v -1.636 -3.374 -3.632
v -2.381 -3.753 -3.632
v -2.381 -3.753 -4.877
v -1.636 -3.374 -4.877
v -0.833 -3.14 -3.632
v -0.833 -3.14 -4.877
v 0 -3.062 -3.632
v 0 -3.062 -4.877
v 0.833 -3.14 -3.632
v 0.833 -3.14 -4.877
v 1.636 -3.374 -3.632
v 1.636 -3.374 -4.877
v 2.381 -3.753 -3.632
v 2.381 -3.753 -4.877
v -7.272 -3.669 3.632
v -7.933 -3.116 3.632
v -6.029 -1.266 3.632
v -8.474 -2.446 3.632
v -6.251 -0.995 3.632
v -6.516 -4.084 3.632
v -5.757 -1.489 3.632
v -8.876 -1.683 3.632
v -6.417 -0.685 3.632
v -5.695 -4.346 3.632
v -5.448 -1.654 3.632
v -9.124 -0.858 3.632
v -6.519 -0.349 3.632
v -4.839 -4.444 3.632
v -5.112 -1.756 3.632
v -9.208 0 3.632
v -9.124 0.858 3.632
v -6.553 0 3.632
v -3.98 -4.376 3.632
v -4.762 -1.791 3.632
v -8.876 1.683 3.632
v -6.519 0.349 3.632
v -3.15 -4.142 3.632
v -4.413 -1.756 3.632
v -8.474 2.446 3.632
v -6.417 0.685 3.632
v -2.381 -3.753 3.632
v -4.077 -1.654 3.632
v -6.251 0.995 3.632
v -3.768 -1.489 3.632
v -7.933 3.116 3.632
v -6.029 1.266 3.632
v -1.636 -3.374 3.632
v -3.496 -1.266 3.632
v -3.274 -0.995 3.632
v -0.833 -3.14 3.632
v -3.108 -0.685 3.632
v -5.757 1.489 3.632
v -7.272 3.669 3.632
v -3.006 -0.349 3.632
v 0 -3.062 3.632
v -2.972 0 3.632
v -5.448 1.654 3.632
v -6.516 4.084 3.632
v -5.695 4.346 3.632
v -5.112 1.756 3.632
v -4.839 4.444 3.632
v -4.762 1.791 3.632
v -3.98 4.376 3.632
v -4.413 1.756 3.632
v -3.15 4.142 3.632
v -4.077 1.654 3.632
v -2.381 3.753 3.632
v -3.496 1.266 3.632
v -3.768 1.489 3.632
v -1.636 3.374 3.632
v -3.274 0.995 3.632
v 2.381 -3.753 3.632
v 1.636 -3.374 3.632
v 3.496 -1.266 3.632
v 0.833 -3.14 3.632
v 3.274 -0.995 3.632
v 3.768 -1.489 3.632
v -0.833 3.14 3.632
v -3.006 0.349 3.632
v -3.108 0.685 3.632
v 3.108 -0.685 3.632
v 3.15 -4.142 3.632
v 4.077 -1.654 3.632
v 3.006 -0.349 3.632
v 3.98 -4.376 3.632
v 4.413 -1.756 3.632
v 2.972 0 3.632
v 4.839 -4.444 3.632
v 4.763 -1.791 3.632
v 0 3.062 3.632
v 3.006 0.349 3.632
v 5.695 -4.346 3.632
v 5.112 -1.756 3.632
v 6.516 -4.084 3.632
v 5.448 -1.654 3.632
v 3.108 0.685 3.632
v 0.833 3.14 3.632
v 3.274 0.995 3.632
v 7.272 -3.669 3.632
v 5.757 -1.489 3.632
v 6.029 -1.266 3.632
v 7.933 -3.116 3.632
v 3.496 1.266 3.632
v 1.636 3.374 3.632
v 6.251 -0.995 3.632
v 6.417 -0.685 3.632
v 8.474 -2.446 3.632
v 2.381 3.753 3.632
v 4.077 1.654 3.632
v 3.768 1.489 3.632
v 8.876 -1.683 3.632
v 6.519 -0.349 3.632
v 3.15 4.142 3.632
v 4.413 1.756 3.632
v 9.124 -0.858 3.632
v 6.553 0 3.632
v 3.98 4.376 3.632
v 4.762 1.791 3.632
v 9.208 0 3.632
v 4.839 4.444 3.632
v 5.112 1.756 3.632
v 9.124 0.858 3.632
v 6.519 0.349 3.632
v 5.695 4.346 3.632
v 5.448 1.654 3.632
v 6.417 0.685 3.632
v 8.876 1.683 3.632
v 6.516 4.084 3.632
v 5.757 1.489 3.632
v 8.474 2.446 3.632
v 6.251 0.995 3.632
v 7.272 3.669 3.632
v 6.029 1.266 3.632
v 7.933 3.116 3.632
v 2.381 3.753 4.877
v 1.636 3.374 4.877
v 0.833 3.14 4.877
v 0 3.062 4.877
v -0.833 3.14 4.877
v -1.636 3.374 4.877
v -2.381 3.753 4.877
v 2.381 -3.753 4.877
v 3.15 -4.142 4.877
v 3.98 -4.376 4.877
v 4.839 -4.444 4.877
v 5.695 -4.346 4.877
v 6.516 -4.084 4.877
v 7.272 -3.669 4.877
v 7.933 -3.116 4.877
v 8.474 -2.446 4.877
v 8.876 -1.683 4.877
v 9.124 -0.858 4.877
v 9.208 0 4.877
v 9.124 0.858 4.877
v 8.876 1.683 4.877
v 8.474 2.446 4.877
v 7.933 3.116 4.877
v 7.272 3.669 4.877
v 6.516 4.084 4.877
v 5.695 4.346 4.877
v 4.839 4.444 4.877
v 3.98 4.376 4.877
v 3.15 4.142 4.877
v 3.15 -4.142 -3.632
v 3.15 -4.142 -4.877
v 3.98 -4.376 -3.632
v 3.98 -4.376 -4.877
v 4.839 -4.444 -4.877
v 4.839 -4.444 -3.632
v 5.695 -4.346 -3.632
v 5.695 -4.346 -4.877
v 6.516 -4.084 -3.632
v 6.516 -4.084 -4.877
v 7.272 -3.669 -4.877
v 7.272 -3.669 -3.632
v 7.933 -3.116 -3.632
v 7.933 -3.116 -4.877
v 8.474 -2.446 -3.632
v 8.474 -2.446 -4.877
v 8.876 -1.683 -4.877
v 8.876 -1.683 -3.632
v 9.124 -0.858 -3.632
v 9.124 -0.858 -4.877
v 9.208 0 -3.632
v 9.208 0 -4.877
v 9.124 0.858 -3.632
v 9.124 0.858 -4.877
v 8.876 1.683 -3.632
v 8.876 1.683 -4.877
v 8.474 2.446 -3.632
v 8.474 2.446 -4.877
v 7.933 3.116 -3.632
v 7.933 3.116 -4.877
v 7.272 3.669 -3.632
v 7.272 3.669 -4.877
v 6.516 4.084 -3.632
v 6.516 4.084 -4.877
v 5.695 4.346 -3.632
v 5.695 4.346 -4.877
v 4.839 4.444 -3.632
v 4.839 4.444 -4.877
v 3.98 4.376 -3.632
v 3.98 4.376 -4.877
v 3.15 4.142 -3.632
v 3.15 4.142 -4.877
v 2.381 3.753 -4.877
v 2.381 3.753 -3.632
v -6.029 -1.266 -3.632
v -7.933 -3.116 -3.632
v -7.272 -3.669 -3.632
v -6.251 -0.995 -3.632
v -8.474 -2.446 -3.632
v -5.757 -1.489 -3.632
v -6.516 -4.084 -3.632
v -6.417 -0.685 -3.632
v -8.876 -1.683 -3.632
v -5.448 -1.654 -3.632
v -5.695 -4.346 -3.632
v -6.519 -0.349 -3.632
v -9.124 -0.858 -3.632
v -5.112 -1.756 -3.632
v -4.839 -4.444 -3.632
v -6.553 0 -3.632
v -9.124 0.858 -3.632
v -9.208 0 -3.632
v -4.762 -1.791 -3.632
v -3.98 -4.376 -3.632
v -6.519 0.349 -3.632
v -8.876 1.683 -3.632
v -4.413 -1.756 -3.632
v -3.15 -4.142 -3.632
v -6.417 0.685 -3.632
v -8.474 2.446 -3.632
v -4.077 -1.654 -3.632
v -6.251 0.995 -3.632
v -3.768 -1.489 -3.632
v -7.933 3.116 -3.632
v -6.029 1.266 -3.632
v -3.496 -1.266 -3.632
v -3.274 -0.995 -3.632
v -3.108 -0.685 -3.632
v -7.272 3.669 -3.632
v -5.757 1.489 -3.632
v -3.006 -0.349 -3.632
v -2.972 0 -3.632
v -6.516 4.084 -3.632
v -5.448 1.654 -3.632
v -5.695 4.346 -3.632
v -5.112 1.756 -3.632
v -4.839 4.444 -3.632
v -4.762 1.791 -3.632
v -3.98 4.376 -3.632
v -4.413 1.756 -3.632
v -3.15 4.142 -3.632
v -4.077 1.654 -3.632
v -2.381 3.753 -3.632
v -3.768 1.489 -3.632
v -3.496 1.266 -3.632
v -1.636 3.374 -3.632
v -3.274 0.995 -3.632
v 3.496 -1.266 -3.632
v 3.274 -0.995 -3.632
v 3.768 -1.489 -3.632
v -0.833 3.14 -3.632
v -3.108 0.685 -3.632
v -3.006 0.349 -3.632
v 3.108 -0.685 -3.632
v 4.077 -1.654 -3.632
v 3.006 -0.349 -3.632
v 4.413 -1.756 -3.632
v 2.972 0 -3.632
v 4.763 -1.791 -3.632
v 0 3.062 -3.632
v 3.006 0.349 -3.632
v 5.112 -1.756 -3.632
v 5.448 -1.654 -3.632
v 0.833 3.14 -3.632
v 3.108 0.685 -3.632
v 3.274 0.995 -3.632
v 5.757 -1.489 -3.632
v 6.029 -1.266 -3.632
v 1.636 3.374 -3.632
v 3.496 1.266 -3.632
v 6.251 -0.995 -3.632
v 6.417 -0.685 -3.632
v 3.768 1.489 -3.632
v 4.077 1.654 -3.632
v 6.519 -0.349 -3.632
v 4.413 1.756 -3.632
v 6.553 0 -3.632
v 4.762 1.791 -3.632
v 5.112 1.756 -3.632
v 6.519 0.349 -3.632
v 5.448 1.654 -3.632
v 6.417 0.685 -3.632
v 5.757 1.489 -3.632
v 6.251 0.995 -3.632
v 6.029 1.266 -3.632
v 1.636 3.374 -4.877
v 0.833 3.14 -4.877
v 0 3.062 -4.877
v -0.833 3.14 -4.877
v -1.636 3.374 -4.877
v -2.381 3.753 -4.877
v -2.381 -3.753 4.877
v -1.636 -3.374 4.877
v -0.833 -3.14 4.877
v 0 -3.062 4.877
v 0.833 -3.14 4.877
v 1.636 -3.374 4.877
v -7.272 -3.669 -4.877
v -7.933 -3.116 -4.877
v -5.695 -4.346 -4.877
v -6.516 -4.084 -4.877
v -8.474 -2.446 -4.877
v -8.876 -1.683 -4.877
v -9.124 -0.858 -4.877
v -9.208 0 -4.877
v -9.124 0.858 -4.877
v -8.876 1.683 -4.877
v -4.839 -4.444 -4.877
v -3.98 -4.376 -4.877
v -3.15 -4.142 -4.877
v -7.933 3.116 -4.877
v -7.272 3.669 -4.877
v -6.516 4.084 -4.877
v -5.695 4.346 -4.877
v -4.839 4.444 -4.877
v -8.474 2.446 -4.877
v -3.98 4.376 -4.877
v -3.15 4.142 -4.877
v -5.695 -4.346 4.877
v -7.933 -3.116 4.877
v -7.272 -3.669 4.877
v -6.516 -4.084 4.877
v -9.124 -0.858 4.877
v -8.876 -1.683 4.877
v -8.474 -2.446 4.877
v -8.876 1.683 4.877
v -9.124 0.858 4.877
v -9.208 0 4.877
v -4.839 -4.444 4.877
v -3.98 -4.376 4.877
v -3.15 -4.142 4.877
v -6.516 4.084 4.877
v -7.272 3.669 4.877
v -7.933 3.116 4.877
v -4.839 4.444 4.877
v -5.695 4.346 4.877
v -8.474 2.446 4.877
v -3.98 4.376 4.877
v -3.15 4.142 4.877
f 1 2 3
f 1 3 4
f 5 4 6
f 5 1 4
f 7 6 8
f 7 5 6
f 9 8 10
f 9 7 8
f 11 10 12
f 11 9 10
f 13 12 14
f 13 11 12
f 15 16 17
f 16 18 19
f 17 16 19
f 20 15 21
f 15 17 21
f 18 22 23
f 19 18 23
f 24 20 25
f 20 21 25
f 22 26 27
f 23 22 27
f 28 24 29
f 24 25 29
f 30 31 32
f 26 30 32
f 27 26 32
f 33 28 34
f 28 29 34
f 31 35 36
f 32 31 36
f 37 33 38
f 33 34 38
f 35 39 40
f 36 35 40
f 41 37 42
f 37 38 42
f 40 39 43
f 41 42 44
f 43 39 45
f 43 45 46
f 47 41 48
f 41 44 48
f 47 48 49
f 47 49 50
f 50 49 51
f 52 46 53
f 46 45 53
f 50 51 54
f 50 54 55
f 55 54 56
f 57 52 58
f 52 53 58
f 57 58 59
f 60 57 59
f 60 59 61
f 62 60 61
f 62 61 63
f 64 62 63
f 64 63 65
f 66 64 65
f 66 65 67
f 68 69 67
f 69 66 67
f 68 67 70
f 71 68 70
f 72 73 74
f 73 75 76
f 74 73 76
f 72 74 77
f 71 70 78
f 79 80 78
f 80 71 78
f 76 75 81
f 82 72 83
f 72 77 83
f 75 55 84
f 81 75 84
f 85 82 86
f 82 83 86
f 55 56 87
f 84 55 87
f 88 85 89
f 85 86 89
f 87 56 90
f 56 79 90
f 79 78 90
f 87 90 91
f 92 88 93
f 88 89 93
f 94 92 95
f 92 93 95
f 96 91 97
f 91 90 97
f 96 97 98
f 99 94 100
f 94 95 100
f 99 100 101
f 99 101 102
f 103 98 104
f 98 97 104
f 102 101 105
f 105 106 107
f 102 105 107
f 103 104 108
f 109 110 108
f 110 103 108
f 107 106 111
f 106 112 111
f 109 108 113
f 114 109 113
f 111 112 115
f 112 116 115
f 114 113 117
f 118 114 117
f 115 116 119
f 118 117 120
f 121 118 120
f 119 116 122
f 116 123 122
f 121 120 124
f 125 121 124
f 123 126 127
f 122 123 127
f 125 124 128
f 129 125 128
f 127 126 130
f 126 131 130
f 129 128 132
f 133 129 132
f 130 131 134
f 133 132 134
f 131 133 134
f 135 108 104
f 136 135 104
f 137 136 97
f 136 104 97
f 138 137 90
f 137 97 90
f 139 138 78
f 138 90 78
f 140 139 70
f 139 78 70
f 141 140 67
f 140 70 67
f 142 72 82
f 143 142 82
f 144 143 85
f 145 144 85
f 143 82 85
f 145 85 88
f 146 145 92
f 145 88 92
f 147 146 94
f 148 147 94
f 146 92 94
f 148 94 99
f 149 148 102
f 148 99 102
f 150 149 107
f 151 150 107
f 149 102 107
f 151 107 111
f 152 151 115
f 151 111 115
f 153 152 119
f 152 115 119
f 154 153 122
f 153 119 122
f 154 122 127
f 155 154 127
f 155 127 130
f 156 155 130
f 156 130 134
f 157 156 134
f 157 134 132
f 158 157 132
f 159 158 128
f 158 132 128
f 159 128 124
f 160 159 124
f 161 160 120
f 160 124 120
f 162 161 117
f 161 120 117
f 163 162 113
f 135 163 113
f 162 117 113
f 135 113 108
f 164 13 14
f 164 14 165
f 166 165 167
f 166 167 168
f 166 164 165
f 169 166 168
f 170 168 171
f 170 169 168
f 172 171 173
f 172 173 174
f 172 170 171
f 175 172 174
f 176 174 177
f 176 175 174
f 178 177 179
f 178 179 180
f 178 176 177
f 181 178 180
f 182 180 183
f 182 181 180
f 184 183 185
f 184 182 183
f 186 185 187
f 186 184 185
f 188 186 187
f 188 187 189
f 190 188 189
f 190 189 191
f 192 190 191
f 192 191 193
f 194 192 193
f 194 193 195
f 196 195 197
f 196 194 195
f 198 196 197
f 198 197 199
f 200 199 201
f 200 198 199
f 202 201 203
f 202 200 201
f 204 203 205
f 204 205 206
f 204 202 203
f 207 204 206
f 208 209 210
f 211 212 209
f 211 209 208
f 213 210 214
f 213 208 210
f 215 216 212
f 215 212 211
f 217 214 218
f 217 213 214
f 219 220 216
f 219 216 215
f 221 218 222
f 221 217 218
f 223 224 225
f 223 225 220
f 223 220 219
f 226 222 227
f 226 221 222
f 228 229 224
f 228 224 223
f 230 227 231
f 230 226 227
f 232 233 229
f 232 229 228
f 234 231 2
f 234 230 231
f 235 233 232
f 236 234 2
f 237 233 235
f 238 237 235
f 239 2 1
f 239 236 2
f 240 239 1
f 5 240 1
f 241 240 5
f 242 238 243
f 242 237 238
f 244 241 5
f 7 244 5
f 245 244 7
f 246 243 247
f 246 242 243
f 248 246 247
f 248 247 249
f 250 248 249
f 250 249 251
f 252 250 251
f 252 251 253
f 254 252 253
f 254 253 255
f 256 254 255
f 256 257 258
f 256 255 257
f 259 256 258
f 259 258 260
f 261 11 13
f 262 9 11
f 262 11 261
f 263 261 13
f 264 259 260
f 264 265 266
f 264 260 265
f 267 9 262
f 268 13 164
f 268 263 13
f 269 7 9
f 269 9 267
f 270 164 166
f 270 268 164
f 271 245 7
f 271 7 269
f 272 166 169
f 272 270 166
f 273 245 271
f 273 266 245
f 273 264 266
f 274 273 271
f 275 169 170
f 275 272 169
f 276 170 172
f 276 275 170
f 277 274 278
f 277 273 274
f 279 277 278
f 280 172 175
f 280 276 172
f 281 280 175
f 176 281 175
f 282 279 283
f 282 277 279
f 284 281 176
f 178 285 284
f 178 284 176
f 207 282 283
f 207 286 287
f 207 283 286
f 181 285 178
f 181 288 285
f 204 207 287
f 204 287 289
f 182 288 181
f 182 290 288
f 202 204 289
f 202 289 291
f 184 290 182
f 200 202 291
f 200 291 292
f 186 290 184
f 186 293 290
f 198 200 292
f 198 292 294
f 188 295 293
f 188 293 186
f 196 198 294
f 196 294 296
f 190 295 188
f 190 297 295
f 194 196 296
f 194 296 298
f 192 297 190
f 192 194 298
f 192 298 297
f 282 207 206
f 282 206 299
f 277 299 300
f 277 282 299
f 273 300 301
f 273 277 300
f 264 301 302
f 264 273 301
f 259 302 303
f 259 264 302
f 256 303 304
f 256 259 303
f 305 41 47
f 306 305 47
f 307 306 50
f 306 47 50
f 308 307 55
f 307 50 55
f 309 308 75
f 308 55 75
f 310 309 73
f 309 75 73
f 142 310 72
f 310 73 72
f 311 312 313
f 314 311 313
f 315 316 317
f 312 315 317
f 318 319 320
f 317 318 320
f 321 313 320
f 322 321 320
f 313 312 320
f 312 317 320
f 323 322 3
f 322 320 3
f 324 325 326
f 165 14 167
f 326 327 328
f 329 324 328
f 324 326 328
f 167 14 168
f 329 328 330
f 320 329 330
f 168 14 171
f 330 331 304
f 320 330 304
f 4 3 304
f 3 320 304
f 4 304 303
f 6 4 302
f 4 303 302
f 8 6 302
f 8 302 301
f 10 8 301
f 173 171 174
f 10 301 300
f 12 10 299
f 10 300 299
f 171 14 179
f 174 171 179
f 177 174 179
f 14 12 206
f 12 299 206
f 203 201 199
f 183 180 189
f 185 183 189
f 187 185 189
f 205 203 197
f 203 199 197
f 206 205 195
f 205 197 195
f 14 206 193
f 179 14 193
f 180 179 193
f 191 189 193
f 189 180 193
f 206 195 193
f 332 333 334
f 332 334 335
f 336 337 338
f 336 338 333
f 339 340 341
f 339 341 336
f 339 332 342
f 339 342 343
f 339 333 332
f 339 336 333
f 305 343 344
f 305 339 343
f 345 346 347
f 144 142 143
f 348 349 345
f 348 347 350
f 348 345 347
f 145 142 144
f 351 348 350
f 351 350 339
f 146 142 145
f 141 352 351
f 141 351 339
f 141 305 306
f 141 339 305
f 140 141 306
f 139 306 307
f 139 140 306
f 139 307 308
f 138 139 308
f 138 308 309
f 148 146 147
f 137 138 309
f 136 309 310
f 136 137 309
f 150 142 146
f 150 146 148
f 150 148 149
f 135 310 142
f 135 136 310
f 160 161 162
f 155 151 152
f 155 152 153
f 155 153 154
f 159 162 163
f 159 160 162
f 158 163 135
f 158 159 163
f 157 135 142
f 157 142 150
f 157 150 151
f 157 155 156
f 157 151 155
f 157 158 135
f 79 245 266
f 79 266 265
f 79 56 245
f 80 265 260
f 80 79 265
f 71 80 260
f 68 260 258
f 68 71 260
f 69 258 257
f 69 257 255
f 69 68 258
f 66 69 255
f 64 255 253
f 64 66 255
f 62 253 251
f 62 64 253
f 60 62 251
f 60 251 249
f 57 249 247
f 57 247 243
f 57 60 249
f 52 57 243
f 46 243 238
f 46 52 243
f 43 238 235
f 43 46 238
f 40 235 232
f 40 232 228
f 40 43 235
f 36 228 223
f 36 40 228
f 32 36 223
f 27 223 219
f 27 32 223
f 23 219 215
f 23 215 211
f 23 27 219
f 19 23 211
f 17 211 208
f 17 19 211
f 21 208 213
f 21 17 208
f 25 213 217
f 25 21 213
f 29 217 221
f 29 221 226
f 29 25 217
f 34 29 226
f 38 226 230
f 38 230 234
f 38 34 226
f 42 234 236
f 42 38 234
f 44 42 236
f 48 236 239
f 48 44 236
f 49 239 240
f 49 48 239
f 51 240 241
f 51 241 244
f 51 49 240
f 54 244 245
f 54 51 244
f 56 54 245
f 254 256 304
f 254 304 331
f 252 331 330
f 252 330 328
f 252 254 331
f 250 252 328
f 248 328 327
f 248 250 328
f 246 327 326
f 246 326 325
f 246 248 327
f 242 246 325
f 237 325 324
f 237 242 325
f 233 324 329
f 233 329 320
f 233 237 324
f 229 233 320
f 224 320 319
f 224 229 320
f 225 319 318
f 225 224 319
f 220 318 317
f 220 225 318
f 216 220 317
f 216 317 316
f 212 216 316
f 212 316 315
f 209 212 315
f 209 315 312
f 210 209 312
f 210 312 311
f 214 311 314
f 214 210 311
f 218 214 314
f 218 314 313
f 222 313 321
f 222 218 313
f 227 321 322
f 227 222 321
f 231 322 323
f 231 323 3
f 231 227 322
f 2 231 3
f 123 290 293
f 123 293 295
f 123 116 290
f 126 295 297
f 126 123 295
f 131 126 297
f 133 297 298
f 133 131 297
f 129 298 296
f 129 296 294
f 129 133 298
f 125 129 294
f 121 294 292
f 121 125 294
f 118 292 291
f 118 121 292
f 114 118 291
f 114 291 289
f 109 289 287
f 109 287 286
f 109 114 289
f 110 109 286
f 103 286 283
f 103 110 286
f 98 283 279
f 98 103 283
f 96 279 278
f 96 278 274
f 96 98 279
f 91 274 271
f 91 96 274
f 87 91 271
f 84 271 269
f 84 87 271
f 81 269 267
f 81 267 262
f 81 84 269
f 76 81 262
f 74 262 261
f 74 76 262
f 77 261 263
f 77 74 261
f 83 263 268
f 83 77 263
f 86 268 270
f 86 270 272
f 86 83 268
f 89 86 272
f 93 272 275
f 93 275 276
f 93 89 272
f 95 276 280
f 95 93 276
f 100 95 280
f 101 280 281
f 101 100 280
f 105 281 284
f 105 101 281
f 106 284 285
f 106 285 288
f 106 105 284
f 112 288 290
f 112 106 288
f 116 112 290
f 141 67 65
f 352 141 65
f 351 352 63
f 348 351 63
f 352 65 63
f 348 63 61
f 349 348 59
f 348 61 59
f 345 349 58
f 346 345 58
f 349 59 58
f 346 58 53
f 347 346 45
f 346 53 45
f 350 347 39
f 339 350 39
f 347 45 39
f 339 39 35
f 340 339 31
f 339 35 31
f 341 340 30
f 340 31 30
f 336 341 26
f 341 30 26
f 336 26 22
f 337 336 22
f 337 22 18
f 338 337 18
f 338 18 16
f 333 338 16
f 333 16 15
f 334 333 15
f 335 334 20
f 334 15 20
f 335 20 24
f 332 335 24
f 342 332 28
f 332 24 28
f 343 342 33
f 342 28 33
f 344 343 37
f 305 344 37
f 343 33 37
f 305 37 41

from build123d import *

# Parameters (mm, degrees)
SKETCH1_R             = 1.7907
BOSS_EXTRUDE1_DEPTH   = 3.6322
BOSS_EXTRUDE1_2_DEPTH = 3.6322
BOSS_EXTRUDE2_DEPTH   = 1.2446


with BuildPart() as part:
    # Sketch1 → Boss-Extrude1 (new body, symmetric)
    with BuildSketch(Plane.XY):
        with Locations((-4.7625, 0)):
            Circle(SKETCH1_R)
    extrude(amount=BOSS_EXTRUDE1_DEPTH, both=True)



with BuildPart() as body_2:
    # Sketch1 → Boss-Extrude1 2 (new body, symmetric)
    with BuildSketch(Plane.XY):
        with Locations((4.7625, 0)):
            Circle(SKETCH1_R)
    extrude(amount=BOSS_EXTRUDE1_2_DEPTH, both=True)


with BuildPart() as part_1:
    add(part.part)

    add(body_2.part)  # Boss-Extrude2 merges body 2
    # Sketch3 → Boss-Extrude2 (add)
    with BuildSketch(Plane.XY.offset(3.6322)):
        with BuildLine():
            ThreePointArc((-2.38125, 3.753354958), (-9.2075, 0), (-2.38125, -3.753354958))
            ThreePointArc((-2.38125, -3.753354958), (0, -3.061709915), (2.38125, -3.753354958))
            ThreePointArc((2.38125, -3.753354958), (9.2075, 0), (2.38125, 3.753354958))
            ThreePointArc((2.38125, 3.753354958), (0, 3.061709915), (-2.38125, 3.753354958))
        make_face()
    boss_extrude2 = extrude(amount=BOSS_EXTRUDE2_DEPTH)

    # Mirror1: Boss-Extrude2 across plane
    add(boss_extrude2.mirror(Plane.XY))


solid = part_1.part
